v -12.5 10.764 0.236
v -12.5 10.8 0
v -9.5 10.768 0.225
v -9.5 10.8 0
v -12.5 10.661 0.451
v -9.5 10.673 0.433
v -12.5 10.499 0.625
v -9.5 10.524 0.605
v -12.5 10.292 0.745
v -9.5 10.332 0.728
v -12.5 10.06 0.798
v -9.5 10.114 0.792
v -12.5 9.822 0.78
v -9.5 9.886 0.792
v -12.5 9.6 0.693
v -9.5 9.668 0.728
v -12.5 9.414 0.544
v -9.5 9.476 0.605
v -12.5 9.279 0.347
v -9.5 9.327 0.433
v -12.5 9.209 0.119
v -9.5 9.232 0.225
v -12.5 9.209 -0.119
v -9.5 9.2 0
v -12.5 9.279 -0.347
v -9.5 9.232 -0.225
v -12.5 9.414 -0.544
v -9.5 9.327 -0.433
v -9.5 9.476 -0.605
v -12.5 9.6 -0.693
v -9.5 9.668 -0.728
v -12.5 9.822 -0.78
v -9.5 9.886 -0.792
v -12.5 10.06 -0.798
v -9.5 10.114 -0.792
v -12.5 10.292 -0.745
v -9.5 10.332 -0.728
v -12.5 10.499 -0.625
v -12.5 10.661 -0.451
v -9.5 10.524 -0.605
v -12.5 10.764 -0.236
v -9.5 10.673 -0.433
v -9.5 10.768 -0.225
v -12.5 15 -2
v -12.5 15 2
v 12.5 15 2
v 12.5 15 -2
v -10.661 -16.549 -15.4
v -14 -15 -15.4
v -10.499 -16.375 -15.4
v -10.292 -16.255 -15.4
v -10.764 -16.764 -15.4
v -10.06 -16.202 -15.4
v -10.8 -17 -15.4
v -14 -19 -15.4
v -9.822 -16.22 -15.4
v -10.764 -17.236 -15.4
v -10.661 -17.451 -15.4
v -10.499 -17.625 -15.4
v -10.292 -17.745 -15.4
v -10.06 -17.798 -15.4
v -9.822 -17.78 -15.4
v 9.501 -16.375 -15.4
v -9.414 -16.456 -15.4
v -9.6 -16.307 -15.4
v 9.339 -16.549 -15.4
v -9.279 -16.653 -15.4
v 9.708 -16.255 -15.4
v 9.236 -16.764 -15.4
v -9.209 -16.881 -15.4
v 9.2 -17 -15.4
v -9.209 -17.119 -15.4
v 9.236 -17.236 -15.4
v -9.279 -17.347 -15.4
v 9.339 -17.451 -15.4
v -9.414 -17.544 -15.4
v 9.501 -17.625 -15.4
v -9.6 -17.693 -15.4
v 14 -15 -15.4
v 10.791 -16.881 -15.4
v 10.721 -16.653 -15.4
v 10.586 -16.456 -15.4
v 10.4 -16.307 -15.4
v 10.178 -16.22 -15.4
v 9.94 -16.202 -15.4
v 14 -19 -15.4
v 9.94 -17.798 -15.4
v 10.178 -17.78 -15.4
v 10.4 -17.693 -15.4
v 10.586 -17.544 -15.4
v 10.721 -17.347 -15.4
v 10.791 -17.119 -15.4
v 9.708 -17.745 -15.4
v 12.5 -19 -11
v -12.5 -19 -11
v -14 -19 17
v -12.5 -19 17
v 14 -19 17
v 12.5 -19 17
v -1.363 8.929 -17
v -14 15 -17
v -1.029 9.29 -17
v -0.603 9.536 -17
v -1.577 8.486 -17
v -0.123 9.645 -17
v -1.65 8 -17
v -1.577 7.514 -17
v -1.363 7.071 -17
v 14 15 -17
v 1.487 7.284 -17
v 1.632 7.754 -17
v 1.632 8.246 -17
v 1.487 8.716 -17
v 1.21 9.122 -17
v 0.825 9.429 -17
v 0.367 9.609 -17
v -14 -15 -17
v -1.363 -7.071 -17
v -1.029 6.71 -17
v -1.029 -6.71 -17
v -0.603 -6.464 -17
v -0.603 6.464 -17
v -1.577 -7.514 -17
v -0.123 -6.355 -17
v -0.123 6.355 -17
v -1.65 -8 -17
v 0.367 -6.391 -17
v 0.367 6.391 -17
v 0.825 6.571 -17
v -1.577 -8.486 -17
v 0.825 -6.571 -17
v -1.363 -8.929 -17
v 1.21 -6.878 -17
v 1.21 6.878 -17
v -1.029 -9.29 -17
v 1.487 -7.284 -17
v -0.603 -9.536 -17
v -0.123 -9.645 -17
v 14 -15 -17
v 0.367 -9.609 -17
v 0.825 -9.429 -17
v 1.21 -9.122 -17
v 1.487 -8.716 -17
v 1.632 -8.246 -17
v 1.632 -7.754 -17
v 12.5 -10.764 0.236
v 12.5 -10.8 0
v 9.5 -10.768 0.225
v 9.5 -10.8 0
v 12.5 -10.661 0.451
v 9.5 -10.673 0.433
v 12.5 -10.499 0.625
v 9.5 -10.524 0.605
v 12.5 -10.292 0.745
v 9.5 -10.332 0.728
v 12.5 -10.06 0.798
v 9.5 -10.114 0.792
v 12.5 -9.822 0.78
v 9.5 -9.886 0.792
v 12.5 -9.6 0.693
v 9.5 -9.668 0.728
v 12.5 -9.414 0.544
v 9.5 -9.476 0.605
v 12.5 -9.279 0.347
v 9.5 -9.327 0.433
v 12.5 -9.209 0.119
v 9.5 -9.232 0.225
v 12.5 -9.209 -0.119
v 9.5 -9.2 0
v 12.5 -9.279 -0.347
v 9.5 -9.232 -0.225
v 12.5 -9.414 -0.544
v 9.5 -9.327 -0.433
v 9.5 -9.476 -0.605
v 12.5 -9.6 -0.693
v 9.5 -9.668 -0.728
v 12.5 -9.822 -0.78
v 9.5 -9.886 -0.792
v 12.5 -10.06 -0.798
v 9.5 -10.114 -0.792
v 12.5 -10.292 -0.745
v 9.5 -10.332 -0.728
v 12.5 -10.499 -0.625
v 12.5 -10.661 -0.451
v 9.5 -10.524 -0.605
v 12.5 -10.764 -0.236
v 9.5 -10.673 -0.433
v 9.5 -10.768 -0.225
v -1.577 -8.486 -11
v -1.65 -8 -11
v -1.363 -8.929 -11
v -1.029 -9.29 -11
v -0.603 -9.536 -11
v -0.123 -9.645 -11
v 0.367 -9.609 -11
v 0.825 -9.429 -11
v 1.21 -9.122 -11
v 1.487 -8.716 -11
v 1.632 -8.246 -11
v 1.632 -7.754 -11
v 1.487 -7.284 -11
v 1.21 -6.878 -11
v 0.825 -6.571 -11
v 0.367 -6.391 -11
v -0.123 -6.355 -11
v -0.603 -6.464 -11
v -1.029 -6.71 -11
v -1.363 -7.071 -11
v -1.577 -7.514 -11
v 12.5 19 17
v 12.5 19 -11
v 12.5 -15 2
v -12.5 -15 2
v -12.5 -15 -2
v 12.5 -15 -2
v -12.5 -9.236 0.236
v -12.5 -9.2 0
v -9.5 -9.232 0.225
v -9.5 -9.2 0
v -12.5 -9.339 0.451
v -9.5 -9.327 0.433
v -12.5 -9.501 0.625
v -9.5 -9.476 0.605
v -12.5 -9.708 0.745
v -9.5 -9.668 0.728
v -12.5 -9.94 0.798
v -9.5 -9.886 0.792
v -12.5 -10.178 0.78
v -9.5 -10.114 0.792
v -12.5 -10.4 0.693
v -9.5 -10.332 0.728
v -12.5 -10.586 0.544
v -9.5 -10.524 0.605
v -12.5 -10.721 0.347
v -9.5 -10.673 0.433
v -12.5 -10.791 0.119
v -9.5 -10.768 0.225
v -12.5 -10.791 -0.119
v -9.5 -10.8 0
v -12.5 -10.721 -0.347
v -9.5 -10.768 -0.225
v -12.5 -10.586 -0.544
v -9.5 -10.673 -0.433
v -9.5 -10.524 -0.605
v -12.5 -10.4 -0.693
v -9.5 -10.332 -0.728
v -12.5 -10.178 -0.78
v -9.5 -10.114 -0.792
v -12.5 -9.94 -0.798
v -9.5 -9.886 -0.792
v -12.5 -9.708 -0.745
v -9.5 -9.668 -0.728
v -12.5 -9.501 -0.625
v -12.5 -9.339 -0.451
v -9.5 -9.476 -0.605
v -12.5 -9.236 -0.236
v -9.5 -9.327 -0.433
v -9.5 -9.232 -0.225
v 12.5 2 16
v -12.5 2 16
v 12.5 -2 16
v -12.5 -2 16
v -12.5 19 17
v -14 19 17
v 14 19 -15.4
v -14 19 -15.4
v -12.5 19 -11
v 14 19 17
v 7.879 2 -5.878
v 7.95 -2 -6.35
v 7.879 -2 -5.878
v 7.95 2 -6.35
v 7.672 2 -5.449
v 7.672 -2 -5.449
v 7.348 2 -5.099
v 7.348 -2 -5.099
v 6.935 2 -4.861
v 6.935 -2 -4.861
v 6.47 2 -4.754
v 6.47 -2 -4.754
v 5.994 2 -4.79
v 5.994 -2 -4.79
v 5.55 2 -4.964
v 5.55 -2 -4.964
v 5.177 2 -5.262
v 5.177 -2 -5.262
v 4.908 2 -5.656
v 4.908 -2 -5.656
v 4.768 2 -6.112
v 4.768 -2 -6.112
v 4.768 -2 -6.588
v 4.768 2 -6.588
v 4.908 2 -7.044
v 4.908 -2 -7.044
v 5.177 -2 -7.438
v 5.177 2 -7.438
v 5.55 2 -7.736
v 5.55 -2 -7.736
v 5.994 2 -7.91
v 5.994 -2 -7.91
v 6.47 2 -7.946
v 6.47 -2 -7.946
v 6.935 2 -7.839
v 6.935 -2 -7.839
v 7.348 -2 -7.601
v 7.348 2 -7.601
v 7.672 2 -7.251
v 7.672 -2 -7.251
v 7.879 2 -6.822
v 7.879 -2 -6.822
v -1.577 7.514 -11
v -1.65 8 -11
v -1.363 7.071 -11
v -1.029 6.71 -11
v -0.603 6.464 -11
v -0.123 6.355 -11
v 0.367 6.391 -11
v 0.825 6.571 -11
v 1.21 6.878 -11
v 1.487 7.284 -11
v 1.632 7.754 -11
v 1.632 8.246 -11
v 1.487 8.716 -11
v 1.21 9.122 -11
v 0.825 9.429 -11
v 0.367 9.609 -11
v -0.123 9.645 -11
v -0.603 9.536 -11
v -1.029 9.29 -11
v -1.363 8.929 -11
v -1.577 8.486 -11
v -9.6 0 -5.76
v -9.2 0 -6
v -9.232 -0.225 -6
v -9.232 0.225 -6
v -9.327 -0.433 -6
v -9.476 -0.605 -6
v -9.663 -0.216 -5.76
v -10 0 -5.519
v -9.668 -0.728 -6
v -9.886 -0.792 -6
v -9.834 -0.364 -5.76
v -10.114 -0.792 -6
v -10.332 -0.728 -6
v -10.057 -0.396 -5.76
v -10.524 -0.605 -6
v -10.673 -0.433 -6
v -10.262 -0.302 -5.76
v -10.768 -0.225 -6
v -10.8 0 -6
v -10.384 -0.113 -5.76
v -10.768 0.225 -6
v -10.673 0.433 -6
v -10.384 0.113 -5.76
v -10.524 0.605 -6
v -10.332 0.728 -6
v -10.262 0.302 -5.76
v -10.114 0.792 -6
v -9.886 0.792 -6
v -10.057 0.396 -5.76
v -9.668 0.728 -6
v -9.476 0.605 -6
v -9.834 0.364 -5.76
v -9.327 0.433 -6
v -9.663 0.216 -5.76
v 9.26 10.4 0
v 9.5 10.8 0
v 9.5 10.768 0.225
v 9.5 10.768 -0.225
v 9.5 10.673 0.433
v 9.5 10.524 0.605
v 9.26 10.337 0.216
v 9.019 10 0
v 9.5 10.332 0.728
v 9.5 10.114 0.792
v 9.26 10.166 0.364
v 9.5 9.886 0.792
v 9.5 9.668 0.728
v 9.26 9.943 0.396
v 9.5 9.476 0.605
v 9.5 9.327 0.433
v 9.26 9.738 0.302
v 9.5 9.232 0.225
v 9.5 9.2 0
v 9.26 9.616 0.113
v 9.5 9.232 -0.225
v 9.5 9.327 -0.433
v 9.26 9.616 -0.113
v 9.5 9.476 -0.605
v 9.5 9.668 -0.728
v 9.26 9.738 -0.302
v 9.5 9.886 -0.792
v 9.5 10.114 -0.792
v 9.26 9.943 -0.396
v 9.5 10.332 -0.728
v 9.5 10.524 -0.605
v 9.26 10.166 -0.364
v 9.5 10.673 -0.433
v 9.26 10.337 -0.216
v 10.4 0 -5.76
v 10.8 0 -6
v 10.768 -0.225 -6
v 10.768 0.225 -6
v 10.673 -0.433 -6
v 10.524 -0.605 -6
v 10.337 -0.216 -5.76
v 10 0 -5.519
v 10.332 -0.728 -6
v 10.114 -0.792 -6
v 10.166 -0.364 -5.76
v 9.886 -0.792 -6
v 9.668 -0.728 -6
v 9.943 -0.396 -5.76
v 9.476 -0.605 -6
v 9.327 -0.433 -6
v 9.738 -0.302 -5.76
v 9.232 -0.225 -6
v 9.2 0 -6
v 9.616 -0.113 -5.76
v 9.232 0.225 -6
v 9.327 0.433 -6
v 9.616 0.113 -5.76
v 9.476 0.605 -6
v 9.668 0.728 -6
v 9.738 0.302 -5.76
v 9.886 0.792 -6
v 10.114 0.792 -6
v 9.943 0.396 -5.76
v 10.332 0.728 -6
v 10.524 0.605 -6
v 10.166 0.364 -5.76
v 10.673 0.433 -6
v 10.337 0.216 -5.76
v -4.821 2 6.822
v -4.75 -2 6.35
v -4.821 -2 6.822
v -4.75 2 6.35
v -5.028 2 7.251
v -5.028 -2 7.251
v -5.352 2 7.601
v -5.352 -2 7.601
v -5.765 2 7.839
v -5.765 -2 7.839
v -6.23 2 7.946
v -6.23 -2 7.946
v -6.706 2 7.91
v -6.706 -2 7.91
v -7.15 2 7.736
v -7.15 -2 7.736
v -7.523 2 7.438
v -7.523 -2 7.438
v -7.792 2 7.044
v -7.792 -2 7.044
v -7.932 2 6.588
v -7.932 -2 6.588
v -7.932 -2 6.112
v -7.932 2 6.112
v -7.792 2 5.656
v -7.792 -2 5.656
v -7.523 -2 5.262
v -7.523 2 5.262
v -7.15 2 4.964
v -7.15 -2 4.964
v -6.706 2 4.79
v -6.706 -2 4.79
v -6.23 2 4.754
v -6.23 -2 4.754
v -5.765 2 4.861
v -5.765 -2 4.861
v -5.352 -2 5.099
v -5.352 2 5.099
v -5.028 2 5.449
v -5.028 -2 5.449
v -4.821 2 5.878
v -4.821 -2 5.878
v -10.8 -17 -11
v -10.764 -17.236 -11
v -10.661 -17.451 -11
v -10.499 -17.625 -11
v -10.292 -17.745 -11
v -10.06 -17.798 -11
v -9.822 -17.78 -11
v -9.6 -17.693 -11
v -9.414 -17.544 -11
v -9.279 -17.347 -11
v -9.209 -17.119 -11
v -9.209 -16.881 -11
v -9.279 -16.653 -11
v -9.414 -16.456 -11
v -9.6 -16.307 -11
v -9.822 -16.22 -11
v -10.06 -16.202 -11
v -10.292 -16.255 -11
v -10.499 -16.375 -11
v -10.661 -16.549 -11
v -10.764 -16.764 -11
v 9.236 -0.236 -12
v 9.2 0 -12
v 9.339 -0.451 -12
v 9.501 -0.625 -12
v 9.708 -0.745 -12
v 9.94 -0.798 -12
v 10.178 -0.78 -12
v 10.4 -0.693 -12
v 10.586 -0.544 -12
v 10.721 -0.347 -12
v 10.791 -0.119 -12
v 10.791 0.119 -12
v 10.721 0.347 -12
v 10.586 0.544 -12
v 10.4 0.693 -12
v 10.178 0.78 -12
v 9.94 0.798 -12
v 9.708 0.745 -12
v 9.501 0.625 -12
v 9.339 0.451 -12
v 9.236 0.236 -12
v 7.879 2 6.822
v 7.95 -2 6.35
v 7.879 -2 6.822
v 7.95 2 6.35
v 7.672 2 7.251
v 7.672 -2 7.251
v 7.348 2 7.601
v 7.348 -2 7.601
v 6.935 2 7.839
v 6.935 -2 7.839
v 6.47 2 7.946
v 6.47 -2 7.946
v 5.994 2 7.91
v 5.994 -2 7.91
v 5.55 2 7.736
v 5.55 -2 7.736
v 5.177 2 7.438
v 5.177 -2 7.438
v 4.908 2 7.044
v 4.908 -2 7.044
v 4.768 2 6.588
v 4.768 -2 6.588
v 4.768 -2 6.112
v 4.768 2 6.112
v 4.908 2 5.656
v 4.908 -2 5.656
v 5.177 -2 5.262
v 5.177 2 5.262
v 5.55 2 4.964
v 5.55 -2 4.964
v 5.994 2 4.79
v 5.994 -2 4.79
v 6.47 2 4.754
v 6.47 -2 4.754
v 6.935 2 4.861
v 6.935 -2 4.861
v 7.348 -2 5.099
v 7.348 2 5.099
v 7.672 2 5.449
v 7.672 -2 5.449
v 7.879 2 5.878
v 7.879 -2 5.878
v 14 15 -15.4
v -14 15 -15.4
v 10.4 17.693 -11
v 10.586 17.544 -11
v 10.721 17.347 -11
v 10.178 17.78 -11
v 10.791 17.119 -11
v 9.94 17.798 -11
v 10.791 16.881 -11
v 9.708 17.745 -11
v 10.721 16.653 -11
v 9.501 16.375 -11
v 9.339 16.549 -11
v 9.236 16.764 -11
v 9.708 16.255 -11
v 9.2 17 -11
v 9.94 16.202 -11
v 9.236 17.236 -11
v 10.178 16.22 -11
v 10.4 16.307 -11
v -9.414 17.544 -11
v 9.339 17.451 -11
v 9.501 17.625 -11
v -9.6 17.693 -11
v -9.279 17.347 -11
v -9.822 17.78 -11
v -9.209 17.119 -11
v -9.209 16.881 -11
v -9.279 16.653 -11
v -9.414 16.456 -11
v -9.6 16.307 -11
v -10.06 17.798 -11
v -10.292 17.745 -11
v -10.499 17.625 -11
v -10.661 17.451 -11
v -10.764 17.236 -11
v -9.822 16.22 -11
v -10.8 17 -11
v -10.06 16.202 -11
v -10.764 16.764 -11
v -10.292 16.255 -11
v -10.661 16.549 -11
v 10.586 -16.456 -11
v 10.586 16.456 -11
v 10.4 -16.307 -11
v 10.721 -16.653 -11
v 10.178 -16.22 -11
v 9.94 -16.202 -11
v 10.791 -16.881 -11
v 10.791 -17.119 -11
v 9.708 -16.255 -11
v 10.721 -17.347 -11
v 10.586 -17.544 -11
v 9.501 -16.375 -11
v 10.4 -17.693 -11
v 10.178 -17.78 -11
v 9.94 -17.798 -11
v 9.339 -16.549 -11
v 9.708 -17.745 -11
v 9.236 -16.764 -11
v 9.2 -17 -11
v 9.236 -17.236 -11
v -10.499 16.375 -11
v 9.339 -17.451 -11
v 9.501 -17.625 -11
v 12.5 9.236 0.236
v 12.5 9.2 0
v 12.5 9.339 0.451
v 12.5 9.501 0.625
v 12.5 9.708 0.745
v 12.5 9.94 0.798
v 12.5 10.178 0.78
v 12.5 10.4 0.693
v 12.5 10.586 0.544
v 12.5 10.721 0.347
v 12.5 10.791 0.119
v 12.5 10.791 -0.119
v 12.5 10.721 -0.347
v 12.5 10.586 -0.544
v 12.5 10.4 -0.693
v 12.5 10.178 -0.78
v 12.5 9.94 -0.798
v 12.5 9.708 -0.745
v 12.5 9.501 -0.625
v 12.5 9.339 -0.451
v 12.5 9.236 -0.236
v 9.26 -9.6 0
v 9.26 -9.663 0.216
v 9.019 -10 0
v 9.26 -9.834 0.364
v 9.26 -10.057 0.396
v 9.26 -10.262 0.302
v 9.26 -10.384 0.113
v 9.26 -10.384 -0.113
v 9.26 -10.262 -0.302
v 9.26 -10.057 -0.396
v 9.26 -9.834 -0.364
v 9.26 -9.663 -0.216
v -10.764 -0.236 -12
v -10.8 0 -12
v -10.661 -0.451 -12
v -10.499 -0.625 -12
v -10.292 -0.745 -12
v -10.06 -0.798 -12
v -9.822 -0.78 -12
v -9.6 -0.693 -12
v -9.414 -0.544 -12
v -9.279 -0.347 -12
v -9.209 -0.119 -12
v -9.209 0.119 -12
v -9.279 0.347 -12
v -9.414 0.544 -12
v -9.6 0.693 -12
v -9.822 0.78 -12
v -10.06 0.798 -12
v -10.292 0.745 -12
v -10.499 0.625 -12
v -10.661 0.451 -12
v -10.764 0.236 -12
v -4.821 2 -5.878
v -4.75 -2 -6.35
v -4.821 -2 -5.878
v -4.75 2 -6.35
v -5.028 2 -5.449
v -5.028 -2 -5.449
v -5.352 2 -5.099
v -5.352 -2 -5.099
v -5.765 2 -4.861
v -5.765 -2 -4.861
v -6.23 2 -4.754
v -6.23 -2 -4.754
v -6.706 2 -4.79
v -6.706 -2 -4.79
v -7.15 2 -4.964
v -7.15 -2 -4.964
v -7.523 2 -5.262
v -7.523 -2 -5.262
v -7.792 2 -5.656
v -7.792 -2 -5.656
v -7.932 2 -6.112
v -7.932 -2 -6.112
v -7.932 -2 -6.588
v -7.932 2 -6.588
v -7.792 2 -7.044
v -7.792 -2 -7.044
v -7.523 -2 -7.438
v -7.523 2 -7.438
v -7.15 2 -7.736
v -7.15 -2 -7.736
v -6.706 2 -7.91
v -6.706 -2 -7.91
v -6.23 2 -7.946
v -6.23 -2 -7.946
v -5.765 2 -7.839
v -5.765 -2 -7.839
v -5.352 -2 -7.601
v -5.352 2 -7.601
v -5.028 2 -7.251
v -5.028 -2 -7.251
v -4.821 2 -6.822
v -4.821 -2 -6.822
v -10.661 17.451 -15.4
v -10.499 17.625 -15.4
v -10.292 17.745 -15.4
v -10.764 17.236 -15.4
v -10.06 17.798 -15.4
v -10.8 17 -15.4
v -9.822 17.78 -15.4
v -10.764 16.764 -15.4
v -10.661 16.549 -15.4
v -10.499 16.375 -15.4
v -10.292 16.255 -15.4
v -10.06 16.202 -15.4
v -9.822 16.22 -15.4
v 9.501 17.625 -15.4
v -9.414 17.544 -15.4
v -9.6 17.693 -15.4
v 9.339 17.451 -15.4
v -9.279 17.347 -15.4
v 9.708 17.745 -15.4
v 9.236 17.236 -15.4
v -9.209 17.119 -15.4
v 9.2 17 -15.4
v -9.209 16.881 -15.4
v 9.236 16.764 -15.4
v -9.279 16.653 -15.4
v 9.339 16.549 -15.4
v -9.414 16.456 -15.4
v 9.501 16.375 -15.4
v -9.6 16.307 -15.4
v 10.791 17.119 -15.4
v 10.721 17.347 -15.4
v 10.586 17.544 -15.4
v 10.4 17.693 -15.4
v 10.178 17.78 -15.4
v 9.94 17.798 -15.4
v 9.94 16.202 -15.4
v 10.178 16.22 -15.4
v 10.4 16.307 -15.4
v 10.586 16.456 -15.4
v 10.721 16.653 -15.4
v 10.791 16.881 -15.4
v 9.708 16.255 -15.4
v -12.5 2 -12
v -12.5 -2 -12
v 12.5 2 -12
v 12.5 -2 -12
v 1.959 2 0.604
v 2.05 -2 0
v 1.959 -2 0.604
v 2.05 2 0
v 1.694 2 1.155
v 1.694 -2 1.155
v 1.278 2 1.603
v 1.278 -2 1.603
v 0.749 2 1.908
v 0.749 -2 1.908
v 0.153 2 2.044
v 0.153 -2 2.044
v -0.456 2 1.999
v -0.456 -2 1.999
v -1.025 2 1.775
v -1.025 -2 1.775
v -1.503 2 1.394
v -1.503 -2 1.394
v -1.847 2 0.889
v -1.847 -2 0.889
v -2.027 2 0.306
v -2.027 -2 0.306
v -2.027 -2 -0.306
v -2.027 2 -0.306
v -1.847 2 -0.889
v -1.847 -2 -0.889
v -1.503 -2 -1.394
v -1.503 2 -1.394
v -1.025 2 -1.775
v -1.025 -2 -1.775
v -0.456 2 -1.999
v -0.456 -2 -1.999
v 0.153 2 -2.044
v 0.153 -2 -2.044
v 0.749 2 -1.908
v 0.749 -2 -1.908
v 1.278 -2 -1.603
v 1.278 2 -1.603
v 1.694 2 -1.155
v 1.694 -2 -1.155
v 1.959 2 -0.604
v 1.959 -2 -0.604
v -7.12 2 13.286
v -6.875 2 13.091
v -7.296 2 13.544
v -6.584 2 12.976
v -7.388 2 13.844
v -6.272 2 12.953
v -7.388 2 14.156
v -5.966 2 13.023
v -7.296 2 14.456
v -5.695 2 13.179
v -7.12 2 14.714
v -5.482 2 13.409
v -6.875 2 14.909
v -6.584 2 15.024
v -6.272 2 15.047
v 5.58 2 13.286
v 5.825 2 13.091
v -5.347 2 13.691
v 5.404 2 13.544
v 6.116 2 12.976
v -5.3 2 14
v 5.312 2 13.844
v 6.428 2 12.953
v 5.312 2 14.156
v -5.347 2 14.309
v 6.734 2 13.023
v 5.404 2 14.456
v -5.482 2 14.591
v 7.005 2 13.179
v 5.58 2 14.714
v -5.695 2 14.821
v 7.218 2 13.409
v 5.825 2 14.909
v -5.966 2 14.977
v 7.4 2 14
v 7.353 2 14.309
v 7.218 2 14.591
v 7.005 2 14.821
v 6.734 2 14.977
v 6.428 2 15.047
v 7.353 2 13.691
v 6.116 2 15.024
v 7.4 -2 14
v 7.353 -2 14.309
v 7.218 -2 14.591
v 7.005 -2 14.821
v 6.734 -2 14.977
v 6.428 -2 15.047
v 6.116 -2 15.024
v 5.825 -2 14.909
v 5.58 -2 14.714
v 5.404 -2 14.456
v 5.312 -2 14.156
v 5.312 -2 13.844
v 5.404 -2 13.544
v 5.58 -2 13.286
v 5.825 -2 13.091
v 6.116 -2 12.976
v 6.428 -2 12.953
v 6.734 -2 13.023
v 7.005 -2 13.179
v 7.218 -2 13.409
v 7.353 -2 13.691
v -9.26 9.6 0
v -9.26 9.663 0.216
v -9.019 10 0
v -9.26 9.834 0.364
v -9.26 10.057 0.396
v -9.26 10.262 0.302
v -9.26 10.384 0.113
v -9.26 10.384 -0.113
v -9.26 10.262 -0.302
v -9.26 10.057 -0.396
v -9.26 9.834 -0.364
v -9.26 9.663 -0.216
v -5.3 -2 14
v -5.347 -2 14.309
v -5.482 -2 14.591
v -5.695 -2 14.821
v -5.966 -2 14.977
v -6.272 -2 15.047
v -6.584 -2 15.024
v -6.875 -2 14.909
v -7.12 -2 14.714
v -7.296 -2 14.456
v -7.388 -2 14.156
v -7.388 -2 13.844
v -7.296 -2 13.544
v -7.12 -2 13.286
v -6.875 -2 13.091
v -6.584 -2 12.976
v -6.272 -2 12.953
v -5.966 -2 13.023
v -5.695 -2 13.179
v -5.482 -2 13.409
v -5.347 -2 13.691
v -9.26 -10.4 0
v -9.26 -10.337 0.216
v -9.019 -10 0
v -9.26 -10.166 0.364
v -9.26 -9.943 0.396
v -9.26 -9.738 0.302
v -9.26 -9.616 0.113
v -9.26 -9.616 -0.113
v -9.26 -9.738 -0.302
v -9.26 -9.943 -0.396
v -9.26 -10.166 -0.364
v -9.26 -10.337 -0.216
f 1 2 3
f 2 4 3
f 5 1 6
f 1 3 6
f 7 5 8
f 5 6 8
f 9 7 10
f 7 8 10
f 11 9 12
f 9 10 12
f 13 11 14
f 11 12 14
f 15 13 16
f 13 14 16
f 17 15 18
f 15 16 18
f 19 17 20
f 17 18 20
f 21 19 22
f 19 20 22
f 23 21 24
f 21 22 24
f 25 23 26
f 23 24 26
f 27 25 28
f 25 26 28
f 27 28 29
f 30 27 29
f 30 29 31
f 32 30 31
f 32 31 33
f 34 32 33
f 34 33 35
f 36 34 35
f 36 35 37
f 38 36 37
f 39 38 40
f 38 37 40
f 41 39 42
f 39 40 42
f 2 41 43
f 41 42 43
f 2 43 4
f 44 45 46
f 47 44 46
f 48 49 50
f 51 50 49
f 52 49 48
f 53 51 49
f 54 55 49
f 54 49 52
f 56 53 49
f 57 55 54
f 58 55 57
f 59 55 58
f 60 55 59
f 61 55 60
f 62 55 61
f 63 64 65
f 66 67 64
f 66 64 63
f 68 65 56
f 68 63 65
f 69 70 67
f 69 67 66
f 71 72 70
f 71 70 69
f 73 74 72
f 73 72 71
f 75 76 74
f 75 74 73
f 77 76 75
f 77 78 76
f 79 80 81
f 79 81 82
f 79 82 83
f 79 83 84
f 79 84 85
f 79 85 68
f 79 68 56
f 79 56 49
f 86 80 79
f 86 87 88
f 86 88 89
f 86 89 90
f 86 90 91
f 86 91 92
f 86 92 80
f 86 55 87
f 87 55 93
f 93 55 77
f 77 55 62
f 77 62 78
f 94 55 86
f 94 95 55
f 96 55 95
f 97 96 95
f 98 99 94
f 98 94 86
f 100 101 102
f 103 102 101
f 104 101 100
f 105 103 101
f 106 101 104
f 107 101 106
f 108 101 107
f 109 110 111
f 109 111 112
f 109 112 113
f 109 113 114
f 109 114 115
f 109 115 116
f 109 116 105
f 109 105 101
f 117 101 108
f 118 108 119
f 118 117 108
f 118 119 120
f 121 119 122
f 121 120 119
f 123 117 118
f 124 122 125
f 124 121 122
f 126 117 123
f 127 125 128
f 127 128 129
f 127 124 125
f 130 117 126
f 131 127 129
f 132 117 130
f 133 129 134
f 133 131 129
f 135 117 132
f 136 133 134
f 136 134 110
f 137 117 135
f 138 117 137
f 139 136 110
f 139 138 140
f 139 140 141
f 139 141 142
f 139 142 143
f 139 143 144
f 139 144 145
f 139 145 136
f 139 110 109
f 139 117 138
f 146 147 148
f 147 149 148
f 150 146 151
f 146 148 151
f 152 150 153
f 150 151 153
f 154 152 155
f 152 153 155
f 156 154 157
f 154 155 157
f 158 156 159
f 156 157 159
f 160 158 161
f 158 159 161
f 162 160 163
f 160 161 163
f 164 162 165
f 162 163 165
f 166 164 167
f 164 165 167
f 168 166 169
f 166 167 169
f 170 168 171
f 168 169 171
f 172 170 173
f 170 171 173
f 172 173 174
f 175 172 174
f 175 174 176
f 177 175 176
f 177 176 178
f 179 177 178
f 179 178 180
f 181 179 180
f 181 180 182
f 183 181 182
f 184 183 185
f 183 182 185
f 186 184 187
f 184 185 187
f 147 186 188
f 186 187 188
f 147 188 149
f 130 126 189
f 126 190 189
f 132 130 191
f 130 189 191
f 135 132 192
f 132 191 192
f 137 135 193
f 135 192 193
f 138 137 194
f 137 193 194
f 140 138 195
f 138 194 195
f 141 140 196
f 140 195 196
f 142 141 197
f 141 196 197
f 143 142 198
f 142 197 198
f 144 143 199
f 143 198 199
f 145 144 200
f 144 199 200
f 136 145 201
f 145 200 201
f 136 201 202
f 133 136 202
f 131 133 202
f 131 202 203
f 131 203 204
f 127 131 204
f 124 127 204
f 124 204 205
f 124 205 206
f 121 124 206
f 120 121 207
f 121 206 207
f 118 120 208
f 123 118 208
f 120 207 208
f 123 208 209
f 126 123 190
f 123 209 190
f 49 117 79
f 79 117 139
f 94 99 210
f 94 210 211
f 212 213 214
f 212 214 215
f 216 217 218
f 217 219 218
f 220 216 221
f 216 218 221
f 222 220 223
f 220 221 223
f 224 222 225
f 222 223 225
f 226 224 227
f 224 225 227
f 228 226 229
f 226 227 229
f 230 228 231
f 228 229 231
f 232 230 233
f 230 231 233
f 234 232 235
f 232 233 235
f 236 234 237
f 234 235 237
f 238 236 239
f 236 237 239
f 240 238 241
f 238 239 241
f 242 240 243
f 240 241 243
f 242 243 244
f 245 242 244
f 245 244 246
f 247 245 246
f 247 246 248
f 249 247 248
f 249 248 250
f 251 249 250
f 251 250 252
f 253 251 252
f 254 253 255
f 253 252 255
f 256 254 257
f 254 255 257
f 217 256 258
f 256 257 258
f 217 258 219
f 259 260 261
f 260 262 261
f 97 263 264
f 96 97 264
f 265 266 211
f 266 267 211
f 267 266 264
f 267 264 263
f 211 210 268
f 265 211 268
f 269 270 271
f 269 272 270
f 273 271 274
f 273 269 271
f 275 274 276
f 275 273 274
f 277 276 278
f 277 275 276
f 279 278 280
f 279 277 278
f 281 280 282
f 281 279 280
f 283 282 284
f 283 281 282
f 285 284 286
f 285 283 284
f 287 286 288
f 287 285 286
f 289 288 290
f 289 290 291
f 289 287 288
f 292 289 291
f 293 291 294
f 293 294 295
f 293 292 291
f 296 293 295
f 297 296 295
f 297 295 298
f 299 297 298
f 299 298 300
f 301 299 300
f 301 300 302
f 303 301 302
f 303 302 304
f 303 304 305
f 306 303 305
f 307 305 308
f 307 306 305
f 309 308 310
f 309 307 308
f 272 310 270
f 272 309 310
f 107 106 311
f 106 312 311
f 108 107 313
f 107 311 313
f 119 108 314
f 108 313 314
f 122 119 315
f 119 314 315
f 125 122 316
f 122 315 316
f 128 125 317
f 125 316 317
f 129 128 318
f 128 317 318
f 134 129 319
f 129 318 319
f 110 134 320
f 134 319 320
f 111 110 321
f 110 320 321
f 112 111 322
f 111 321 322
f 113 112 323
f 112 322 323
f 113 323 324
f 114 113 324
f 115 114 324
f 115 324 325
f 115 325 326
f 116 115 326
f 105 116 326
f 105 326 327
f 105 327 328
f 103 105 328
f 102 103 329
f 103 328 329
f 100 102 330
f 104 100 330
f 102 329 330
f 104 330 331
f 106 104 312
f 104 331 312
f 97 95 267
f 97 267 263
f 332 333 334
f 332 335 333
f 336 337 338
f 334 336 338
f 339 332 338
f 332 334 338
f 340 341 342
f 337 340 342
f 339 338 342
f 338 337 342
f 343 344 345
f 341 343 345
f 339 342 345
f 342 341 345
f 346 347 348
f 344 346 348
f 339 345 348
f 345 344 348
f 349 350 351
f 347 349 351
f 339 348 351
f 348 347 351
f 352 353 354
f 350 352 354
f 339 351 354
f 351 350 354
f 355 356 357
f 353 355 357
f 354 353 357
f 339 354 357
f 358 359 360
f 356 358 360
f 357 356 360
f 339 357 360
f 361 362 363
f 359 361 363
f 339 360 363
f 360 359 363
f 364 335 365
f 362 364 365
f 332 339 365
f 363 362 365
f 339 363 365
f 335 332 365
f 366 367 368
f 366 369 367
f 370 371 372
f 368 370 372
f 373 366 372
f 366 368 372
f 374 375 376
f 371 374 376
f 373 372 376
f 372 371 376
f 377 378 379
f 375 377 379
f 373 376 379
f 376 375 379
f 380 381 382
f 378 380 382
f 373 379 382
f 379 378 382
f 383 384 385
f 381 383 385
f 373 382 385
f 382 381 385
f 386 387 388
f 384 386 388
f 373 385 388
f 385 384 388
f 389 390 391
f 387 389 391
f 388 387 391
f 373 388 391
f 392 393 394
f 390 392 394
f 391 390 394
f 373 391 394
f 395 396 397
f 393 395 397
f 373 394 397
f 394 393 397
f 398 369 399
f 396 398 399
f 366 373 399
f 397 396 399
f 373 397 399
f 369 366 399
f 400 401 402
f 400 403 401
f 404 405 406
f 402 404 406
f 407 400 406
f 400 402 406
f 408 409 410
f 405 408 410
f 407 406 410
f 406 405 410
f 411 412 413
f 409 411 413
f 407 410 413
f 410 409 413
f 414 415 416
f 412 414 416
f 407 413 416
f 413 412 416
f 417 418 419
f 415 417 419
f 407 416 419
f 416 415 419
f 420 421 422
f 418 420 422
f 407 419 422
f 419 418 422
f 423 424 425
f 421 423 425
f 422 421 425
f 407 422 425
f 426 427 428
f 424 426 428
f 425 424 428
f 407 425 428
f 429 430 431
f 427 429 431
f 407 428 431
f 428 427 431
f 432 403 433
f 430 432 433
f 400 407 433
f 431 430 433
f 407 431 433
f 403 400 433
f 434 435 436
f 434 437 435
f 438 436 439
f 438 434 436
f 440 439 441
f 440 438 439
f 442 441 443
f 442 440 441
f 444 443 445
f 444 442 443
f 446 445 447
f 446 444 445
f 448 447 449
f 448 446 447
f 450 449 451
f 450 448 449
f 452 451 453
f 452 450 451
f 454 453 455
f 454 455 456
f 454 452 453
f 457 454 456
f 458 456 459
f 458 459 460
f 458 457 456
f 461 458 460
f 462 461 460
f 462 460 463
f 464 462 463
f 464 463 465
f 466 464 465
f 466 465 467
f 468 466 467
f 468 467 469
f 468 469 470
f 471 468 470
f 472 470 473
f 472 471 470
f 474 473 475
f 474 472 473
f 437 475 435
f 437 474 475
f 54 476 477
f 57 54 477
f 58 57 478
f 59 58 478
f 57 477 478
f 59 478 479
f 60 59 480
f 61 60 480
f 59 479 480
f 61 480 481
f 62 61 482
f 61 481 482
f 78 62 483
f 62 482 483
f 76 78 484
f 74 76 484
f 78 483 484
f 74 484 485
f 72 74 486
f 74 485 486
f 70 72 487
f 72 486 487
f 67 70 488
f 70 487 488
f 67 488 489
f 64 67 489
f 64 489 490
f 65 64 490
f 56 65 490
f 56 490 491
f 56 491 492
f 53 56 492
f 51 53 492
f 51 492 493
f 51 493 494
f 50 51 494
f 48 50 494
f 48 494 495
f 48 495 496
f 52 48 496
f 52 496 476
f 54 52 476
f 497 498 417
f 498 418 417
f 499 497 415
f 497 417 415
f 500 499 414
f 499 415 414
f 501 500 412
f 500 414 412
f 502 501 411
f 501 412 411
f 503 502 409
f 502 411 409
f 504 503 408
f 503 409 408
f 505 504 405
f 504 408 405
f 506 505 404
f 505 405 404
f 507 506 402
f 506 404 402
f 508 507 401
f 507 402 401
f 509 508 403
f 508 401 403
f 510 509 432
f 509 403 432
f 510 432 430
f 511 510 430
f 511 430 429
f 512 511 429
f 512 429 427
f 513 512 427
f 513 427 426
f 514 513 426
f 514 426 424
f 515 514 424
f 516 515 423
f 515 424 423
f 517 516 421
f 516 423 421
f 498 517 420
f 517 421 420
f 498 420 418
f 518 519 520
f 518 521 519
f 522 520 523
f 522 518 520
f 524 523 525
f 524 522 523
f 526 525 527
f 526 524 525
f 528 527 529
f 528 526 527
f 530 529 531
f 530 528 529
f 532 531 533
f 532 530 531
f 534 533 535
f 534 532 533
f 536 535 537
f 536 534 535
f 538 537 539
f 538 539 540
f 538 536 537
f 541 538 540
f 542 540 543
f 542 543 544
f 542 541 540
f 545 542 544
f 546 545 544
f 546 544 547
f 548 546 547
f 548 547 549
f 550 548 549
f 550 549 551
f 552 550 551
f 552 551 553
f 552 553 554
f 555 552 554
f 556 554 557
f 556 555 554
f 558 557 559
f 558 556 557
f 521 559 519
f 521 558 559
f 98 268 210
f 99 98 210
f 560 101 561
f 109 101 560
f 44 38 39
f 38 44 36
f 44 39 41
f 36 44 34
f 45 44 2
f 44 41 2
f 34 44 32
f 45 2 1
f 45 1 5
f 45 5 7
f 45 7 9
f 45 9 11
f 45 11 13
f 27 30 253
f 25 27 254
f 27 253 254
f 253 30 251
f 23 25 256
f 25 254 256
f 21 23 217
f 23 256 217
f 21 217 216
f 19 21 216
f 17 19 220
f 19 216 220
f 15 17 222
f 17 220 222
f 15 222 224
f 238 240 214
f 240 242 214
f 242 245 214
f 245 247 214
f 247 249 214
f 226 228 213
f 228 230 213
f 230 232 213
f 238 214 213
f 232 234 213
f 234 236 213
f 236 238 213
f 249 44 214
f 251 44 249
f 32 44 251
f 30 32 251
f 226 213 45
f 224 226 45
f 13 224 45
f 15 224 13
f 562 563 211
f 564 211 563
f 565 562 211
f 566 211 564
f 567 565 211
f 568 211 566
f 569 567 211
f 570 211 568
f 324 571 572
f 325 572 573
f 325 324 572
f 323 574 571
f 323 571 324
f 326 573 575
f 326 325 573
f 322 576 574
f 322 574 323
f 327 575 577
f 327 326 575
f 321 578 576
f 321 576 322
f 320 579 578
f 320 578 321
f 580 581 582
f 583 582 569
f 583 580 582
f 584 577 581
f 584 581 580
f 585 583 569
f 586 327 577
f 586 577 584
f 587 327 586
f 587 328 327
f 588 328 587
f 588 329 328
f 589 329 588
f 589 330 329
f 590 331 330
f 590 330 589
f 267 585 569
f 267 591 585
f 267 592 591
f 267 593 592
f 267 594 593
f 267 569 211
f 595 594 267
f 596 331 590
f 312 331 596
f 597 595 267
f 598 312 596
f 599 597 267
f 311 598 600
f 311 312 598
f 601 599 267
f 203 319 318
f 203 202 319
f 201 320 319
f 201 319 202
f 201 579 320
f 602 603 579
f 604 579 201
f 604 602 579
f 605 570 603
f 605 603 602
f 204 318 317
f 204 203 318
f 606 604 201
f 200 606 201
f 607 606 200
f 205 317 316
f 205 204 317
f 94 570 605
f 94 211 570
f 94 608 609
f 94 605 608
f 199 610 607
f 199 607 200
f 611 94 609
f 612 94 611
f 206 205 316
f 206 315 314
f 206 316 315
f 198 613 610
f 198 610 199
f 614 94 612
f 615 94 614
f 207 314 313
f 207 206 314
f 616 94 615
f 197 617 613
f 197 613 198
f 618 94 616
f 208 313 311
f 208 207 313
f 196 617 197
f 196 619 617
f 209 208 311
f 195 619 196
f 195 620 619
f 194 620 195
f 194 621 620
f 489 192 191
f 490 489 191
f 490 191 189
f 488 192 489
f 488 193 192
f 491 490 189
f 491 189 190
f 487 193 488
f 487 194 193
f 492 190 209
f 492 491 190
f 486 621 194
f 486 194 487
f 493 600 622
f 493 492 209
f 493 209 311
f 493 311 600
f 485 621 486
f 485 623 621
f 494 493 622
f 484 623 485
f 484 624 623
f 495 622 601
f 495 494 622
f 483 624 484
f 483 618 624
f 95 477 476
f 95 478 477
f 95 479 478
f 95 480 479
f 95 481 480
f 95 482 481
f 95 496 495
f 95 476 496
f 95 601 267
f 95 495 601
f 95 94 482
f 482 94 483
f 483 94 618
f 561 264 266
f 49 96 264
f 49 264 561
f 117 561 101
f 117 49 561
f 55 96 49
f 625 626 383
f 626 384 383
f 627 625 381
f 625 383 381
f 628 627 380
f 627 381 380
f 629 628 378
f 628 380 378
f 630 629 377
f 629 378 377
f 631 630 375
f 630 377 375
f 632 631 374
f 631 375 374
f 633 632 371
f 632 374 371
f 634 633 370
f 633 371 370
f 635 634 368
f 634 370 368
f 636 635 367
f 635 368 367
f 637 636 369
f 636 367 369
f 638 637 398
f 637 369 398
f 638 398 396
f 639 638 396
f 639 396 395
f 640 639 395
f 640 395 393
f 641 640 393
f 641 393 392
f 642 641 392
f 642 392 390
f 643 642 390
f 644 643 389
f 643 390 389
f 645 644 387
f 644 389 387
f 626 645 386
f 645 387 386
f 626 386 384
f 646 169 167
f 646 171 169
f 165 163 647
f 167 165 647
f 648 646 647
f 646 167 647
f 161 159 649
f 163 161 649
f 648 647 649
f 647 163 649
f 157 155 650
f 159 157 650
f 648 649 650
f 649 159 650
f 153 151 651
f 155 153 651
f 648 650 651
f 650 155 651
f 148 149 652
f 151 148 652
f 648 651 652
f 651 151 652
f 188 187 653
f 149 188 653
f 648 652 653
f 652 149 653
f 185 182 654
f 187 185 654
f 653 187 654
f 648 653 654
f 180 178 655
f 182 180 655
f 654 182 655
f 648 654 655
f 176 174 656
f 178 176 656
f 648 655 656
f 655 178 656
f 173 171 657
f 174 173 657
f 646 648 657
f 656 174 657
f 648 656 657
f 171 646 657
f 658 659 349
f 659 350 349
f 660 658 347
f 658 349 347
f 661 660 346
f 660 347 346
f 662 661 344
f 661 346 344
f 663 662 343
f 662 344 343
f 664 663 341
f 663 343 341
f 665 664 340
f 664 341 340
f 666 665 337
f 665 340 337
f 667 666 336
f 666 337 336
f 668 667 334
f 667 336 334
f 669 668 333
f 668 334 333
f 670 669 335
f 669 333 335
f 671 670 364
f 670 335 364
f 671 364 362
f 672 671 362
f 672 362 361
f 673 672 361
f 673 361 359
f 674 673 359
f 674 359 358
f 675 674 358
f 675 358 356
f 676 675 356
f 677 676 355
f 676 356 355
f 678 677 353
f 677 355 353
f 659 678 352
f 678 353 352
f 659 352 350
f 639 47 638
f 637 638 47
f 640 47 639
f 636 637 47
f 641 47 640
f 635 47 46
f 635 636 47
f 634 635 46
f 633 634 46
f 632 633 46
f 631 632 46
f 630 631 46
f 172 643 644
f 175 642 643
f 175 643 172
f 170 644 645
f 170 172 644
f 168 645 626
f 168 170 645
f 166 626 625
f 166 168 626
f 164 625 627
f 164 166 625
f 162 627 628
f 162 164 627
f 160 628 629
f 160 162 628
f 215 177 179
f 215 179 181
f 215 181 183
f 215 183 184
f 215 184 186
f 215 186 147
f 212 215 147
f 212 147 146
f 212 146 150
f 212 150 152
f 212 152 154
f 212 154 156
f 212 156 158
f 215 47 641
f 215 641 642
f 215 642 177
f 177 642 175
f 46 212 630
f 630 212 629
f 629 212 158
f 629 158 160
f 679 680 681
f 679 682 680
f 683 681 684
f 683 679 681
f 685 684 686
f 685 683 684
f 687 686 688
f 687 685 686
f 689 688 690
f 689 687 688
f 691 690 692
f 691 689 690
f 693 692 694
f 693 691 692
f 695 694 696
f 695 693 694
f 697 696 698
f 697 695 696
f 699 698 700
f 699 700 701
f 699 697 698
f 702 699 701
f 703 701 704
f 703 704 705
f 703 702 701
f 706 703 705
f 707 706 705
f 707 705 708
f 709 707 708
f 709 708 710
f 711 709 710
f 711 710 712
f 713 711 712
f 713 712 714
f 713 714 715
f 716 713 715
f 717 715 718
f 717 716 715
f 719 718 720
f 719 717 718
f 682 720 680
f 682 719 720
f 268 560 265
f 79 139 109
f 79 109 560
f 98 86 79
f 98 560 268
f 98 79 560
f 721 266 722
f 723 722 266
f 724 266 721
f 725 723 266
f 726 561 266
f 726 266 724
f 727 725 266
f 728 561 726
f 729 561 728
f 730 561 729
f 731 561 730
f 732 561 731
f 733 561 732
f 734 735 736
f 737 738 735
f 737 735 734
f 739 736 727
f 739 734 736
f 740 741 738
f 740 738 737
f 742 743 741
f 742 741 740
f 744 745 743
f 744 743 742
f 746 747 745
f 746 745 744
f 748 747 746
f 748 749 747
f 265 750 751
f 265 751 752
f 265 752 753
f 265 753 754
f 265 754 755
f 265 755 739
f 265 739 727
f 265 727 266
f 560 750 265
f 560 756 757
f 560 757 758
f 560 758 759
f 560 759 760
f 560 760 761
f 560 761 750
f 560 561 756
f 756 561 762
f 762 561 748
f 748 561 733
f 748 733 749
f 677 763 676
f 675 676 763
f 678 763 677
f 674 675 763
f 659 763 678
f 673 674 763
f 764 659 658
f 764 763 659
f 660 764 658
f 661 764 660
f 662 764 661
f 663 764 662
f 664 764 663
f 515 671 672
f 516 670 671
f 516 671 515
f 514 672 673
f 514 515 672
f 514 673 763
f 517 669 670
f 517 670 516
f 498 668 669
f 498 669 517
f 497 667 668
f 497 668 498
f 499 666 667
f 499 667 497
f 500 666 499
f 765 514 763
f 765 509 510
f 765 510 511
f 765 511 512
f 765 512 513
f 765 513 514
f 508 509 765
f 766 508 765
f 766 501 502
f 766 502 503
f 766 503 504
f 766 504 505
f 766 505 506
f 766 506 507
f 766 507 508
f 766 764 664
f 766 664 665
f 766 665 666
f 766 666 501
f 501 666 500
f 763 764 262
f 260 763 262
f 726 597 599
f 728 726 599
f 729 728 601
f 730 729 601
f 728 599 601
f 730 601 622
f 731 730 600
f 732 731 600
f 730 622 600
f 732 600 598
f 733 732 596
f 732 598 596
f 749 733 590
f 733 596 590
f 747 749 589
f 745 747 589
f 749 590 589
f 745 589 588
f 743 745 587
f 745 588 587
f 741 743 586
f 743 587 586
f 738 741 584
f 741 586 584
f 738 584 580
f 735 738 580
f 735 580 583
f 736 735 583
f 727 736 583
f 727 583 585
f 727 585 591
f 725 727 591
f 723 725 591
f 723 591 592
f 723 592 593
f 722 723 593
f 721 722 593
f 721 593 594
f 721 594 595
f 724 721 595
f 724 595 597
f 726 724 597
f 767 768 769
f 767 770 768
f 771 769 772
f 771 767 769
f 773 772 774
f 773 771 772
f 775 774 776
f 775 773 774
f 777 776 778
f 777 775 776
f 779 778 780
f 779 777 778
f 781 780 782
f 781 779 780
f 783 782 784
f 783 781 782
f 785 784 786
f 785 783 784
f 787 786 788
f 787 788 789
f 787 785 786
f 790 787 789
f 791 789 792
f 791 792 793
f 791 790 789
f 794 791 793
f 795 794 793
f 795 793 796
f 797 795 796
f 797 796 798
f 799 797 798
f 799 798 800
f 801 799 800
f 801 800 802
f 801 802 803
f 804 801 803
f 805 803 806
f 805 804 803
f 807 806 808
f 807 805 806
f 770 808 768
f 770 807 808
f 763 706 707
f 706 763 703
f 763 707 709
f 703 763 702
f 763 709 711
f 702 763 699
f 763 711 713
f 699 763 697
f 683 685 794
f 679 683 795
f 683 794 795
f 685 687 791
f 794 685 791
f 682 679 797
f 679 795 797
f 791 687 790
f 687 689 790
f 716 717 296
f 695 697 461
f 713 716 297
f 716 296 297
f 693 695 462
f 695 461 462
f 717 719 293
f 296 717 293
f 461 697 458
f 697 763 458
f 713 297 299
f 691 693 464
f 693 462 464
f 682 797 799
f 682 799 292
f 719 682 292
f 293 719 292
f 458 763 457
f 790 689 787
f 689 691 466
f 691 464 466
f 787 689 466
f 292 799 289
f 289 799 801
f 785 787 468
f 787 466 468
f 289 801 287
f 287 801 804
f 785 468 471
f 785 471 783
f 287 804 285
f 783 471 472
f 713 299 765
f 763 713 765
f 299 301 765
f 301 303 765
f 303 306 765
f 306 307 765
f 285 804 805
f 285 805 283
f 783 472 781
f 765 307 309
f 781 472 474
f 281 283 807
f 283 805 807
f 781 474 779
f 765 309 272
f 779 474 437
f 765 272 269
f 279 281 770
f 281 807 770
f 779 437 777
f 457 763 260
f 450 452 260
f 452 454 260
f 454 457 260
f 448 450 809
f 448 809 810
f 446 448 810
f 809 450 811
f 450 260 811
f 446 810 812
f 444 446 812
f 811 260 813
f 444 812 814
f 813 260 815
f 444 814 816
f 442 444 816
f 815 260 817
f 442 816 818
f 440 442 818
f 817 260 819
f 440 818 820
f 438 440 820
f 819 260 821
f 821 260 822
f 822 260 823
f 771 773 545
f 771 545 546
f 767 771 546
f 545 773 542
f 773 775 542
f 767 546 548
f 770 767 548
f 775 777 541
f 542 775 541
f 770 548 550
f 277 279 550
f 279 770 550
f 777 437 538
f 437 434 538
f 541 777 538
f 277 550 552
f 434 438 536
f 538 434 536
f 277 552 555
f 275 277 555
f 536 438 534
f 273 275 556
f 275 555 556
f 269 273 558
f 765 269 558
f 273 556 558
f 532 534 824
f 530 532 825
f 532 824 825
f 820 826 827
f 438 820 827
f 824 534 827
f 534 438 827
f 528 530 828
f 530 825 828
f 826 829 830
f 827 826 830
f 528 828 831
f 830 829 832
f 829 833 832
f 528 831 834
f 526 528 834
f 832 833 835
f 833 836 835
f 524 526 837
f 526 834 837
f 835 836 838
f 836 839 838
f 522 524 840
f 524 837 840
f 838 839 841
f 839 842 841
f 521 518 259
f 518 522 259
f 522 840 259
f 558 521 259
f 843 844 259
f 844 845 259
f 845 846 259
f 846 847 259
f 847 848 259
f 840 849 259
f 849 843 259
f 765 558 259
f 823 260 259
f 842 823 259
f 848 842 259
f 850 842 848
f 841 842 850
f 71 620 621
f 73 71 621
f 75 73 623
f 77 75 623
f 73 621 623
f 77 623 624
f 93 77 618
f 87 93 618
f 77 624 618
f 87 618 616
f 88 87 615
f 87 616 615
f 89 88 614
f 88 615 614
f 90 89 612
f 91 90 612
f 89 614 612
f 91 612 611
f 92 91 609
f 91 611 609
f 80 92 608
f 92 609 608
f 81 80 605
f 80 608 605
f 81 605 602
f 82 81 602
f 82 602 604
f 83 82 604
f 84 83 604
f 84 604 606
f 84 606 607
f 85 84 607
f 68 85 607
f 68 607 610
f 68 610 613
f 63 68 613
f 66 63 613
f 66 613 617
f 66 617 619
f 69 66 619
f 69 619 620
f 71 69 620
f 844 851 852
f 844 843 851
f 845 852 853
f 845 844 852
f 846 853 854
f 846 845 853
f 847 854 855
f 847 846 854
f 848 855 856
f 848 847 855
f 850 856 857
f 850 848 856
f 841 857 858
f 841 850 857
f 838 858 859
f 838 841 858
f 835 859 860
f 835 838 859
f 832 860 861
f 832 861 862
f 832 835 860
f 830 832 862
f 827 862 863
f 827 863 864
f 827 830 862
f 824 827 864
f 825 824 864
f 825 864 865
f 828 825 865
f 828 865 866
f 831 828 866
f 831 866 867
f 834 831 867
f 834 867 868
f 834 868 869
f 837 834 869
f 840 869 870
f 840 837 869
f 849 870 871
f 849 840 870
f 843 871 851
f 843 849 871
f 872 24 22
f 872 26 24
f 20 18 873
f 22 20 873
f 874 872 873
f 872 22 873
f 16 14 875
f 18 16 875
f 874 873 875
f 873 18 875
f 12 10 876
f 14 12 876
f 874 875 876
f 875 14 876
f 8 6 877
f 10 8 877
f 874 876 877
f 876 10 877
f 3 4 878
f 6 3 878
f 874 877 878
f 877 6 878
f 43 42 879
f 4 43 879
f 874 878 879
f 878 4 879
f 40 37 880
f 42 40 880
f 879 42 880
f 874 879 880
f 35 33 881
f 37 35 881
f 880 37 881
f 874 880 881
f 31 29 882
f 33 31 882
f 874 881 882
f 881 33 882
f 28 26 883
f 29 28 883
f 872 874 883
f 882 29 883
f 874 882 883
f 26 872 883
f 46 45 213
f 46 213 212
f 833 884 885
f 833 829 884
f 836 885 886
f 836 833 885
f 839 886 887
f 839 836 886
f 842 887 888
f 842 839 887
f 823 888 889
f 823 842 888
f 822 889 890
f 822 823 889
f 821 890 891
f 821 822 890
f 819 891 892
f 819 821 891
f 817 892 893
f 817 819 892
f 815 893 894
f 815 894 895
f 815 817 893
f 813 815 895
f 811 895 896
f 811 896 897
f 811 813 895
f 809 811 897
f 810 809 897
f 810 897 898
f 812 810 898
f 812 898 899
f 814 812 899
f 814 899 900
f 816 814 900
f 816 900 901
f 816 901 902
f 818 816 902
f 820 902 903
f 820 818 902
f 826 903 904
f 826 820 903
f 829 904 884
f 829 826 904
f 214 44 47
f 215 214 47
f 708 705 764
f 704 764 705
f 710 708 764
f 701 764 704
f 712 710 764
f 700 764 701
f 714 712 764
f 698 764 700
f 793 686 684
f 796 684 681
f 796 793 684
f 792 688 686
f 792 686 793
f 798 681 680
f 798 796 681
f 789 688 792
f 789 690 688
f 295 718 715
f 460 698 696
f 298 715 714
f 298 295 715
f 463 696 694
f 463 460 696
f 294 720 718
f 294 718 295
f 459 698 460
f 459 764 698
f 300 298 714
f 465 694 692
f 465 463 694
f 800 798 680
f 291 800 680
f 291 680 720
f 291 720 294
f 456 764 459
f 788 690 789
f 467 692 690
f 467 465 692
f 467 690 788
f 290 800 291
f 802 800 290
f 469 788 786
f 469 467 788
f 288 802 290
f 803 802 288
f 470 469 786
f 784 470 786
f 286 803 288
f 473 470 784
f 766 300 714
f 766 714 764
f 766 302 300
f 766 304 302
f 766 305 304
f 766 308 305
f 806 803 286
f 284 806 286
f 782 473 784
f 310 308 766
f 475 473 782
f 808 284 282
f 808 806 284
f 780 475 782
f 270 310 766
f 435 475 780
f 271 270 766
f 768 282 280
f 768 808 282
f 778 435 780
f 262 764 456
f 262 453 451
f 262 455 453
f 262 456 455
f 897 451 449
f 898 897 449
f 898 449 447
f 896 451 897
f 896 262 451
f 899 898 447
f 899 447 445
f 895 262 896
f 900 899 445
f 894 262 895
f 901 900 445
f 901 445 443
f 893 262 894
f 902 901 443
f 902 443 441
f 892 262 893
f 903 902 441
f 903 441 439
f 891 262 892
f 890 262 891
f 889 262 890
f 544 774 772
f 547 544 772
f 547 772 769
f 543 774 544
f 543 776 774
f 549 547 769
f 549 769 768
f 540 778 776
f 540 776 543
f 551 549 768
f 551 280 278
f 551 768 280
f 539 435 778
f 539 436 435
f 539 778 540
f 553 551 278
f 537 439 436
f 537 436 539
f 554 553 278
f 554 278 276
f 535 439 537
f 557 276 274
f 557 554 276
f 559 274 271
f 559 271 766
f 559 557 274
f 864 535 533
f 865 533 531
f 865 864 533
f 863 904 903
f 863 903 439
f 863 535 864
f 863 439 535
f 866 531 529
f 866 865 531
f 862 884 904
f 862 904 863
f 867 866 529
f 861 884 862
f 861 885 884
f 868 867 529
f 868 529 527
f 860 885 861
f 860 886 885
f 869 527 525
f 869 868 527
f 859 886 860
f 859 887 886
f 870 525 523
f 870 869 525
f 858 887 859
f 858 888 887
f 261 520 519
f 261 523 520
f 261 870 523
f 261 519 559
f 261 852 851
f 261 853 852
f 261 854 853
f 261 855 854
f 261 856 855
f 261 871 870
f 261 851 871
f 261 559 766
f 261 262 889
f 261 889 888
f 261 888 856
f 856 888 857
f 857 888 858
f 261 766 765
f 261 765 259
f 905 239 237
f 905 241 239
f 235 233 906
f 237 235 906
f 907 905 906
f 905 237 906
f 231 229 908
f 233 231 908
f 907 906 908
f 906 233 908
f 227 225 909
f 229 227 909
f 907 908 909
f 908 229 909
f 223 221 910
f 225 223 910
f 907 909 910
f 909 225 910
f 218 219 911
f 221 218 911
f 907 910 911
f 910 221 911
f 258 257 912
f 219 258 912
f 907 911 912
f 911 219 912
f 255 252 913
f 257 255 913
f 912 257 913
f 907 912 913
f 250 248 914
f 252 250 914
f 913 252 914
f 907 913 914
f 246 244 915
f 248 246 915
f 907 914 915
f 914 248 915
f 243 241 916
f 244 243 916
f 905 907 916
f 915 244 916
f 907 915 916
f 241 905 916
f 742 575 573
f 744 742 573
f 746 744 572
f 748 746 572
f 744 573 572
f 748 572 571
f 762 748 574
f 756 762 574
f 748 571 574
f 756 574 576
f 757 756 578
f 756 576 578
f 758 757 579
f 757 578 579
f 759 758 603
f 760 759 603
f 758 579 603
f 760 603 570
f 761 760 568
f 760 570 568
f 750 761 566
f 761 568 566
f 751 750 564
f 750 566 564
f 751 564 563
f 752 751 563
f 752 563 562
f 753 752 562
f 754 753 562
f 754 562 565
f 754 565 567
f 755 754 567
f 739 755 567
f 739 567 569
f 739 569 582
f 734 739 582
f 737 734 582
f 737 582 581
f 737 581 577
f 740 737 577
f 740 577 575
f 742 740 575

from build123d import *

# Parameters (mm, degrees)
F1_DEPTH         = 19
F2_W             = 25
F2_H             = 4
F3_DEPTH         = 15
F4_W             = 25
F4_H             = 28
F4_R             = 1.6
F4_R_2           = 2.05
F4_R_3           = 1.05
F5_DEPTH         = 2
F7_D             = 1.6
F7_DEPTH         = 6
F7_TIP           = 0.4806884952
F8_W             = 28
F8_H             = 4
F9_DEPTH         = 1.6
F10_D            = 1.6
F10_DEPTH        = 6
F10_START        = 1.6
F10_TIP          = 0.4806884952
F11_D            = 3.3
F11_DEPTH        = 6
F11_TIP          = 0.9914200214
F14_D            = 1.6
F14_DEPTH        = 3
F14_TIP          = 0.4806884952
F14_ON_F12_D     = 1.6
F14_ON_F12_DEPTH = 3
F14_ON_F12_TIP   = 0.4806884952


with BuildPart() as f1:
    # F0 (on Front) → F1 (new body, symmetric)
    with BuildSketch(Plane.XZ):
        Polygon((-14, -17), (14, -17), (14, 17), (12.5, 17), (12.5, -11), (-12.5, -11), (-12.5, 17), (-14, 17), align=None)
    extrude(amount=F1_DEPTH, both=True)

    # F8 (on face) → F9 (cut)
    with BuildSketch(Plane(origin=(0, 0, -17), x_dir=(1, 0, 0), z_dir=(0, 0, -1))):
        with Locations((0, -17)):
            Rectangle(F8_W, F8_H)
        with Locations((0, 17)):
            Rectangle(F8_W, F8_H)
    extrude(amount=-F9_DEPTH, mode=Mode.SUBTRACT)

    # F10
    # its depths count from where the whole tool has entered the part; down to there all is cleared
    with Locations(Plane(origin=(0, 0, -17), x_dir=(1, 0, 0), z_dir=(0, 0, -1)).offset(-F10_START)):
        with Locations((-10, -17), (10, -17), (-10, 17), (10, 17)):
            Hole(F10_D / 2, depth=F10_DEPTH)
            with Locations((0, 0, -(F10_DEPTH + F10_TIP / 2))):  # 118° drill point
                Cone(0, F10_D / 2, F10_TIP, mode=Mode.SUBTRACT)

    # F11
    with Locations(Plane(origin=(0, 0, -17), x_dir=(1, 0, 0), z_dir=(0, 0, -1))):
        with Locations((0, -8), (0, 8)):
            Hole(F11_D / 2, depth=F11_DEPTH)
            with Locations((0, 0, -(F11_DEPTH + F11_TIP / 2))):  # 118° drill point
                Cone(0, F11_D / 2, F11_TIP, mode=Mode.SUBTRACT)


with BuildPart() as f3:
    # F2 (on Front) → F3 (new body, symmetric)
    with BuildSketch(Plane.XZ):
        Rectangle(F2_W, F2_H)
    extrude(amount=F3_DEPTH, both=True)

    # F14
    with Locations(Plane.YZ.offset(12.5)):
        with Locations((-10, 0), (10, 0)):
            Hole(F14_D / 2, depth=F14_DEPTH)
            with Locations((0, 0, -(F14_DEPTH + F14_TIP / 2))):  # 118° drill point
                Cone(0, F14_D / 2, F14_TIP, mode=Mode.SUBTRACT)

    # F14 on F12
    with Locations(Plane(origin=(-12.5, 0, 0), x_dir=(0, -1, 0), z_dir=(-1, 0, 0))):
        with Locations((-10, 0), (10, 0)):
            Hole(F14_ON_F12_D / 2, depth=F14_ON_F12_DEPTH)
            with Locations((0, 0, -(F14_ON_F12_DEPTH + F14_ON_F12_TIP / 2))):  # 118° drill point
                Cone(0, F14_ON_F12_D / 2, F14_ON_F12_TIP, mode=Mode.SUBTRACT)


with BuildPart() as f5:
    # F4 (on Front) → F5 (new body, symmetric)
    with BuildSketch(Plane.XZ):
        with Locations((0, 2)):
            Rectangle(F4_W, F4_H)
        with Locations((-6.35, -6.35)):
            Circle(F4_R, mode=Mode.SUBTRACT)
        with Locations((6.35, -6.35)):
            Circle(F4_R, mode=Mode.SUBTRACT)
        Circle(F4_R_2, mode=Mode.SUBTRACT)
        with Locations((-6.35, 6.35)):
            Circle(F4_R, mode=Mode.SUBTRACT)
        with Locations((-6.35, 14)):
            Circle(F4_R_3, mode=Mode.SUBTRACT)
        with Locations((6.35, 6.35)):
            Circle(F4_R, mode=Mode.SUBTRACT)
        with Locations((6.35, 14)):
            Circle(F4_R_3, mode=Mode.SUBTRACT)
    extrude(amount=F5_DEPTH, both=True)

    # F7
    with Locations(Plane(origin=(0, 0, -12), x_dir=(1, 0, 0), z_dir=(0, 0, -1))):
        with Locations((-10, 0), (10, 0)):
            Hole(F7_D / 2, depth=F7_DEPTH)
            with Locations((0, 0, -(F7_DEPTH + F7_TIP / 2))):  # 118° drill point
                Cone(0, F7_D / 2, F7_TIP, mode=Mode.SUBTRACT)


solid = Compound([f1.part, f3.part, f5.part])
